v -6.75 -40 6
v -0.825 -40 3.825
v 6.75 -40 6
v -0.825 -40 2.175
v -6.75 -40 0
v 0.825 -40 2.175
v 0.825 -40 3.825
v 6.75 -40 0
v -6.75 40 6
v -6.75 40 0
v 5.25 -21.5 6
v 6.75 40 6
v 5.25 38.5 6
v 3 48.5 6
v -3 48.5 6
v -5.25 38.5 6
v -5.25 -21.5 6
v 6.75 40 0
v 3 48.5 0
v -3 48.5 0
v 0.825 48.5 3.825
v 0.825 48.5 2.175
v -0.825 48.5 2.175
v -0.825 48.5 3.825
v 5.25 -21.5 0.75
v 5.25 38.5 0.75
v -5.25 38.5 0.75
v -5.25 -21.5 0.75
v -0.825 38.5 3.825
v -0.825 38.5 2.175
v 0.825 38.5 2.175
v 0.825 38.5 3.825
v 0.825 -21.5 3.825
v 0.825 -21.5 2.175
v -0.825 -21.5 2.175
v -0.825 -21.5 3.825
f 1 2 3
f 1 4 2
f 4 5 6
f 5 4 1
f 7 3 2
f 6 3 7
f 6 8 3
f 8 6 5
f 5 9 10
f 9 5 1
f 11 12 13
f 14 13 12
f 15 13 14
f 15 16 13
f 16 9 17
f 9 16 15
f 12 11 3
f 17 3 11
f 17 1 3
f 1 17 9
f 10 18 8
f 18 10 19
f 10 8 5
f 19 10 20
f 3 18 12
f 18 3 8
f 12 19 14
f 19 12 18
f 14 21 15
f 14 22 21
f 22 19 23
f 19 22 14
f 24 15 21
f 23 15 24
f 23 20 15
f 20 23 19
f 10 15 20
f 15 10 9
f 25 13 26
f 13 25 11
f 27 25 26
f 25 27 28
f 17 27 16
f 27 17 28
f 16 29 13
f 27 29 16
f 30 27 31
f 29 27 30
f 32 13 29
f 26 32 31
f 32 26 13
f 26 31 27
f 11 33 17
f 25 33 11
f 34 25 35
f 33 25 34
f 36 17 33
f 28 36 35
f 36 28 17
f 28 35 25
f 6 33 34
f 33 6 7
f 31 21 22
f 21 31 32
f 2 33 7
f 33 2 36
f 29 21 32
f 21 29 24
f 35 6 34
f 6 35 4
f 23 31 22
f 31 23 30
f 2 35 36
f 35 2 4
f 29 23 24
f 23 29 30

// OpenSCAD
$fn=50;
ts=1.5;

lenta=[10+0.5,60,3];//размер ячейкм
ddd=0.25;
gzd=[1.4+ddd,2.5+ddd];
hv=20;
hr=ts*2+lenta.z;
ln=8;

difference(){
    hull(){
        translate([0,0,hr/2])cube([lenta.x+ts*2, lenta.y+hv, hr],true);
        translate([0,(lenta.y+hv)/2+ln,hr/2])cube([hr, 1, hr],true);
    }
    translate([0,hv/2-ts,hr/2+ts/2])cube([lenta.x, lenta.y, hr],true);
    translate([0,0,hr/2])cube([gzd.x, lenta.y*5, gzd.x],true);
}
